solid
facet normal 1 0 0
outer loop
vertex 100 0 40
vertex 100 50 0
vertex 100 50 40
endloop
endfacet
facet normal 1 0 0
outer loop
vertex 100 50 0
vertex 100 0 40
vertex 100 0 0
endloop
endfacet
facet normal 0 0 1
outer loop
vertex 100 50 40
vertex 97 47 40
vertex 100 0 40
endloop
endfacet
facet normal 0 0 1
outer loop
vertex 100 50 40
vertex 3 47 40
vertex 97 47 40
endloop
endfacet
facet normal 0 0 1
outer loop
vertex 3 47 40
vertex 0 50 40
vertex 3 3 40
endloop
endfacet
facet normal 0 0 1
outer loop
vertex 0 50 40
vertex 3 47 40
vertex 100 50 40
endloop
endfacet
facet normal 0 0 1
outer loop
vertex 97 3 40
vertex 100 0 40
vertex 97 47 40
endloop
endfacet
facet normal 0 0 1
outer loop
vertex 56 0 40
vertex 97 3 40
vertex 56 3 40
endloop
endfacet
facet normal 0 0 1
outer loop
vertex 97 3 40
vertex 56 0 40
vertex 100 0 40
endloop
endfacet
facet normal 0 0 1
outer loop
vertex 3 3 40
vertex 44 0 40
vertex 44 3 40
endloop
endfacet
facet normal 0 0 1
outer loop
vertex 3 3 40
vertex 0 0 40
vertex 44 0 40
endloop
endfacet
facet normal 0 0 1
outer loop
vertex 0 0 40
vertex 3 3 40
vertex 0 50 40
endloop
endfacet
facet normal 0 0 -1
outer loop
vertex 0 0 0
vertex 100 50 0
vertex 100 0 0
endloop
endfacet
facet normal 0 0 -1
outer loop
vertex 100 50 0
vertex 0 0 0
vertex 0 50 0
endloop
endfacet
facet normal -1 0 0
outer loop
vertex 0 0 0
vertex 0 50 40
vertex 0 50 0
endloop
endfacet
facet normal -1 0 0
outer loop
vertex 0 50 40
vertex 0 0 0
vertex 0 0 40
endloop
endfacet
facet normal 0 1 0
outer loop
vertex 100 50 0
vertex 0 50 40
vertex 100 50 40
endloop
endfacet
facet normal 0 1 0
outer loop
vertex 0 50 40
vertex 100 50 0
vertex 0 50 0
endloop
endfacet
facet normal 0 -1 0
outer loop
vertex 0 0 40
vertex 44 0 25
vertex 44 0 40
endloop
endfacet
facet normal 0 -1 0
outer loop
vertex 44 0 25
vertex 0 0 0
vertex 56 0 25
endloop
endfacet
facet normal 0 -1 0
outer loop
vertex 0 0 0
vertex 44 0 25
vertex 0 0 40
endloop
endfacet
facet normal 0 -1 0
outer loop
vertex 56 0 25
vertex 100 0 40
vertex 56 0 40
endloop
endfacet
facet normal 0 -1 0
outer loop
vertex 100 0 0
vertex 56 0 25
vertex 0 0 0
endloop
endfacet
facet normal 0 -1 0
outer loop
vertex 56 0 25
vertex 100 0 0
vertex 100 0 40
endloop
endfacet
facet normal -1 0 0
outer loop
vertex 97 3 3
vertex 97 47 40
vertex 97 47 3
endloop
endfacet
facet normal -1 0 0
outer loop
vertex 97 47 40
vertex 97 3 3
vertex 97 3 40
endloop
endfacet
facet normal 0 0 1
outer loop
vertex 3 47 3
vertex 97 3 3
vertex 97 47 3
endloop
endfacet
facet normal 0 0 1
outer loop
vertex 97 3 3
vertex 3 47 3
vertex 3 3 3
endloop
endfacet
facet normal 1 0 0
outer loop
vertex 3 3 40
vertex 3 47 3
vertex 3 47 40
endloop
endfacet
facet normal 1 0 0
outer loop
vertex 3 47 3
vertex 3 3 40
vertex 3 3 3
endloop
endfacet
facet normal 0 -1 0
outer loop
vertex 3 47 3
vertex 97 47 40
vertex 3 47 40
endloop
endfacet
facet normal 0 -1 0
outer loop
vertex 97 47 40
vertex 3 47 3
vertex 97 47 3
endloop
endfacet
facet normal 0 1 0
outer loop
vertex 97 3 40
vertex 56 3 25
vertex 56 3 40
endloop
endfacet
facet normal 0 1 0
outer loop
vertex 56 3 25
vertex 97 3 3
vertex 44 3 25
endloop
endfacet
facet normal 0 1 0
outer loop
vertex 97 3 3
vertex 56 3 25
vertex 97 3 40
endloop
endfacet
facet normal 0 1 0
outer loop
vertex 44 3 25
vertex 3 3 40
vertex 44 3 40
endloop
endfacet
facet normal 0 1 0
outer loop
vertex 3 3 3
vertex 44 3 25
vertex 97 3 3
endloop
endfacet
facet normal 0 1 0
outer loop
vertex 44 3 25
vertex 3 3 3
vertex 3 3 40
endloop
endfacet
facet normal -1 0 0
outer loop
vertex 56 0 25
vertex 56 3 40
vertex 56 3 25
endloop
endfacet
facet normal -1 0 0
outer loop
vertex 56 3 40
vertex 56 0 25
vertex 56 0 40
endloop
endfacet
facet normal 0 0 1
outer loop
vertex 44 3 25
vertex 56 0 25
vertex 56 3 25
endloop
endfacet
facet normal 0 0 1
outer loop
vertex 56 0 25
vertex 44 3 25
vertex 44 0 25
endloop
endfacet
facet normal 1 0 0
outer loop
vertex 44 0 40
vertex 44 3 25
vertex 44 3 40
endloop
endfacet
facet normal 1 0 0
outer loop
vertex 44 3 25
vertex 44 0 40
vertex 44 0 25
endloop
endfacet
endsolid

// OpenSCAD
$fn = 32;

// ----------------------------------------------------------------------
// Enclosure box: notch enclosure
// ----------------------------------------------------------------------

// --- parameters (mm) ---
box_l = 100;              // outer length, X
box_w = 50;               // outer width, Y
box_h = 40;               // outer height
wall_t = 3;               // wall thickness
notch_w = 12;             // cable notch width
notch_h = 15;             // cable notch height
fit_tol = 0.02;           // tolerance for press fits, mm
free_tol = 0.2;           // tolerance for clearance fits, mm

inner_h = box_h - wall_t;  // cavity depth
boss_h = inner_h - 2;  // corner boss height

difference() {
  union() {
    difference() {
      cube([box_l, box_w, box_h]);
      translate([wall_t, wall_t, wall_t])
        cube([box_l - 2 * wall_t, box_w - 2 * wall_t, box_h]);
    }
  }
  translate([box_l / 2 - notch_w / 2, -1, box_h - notch_h])
    cube([notch_w, wall_t + 2, notch_h + 1]);
}
